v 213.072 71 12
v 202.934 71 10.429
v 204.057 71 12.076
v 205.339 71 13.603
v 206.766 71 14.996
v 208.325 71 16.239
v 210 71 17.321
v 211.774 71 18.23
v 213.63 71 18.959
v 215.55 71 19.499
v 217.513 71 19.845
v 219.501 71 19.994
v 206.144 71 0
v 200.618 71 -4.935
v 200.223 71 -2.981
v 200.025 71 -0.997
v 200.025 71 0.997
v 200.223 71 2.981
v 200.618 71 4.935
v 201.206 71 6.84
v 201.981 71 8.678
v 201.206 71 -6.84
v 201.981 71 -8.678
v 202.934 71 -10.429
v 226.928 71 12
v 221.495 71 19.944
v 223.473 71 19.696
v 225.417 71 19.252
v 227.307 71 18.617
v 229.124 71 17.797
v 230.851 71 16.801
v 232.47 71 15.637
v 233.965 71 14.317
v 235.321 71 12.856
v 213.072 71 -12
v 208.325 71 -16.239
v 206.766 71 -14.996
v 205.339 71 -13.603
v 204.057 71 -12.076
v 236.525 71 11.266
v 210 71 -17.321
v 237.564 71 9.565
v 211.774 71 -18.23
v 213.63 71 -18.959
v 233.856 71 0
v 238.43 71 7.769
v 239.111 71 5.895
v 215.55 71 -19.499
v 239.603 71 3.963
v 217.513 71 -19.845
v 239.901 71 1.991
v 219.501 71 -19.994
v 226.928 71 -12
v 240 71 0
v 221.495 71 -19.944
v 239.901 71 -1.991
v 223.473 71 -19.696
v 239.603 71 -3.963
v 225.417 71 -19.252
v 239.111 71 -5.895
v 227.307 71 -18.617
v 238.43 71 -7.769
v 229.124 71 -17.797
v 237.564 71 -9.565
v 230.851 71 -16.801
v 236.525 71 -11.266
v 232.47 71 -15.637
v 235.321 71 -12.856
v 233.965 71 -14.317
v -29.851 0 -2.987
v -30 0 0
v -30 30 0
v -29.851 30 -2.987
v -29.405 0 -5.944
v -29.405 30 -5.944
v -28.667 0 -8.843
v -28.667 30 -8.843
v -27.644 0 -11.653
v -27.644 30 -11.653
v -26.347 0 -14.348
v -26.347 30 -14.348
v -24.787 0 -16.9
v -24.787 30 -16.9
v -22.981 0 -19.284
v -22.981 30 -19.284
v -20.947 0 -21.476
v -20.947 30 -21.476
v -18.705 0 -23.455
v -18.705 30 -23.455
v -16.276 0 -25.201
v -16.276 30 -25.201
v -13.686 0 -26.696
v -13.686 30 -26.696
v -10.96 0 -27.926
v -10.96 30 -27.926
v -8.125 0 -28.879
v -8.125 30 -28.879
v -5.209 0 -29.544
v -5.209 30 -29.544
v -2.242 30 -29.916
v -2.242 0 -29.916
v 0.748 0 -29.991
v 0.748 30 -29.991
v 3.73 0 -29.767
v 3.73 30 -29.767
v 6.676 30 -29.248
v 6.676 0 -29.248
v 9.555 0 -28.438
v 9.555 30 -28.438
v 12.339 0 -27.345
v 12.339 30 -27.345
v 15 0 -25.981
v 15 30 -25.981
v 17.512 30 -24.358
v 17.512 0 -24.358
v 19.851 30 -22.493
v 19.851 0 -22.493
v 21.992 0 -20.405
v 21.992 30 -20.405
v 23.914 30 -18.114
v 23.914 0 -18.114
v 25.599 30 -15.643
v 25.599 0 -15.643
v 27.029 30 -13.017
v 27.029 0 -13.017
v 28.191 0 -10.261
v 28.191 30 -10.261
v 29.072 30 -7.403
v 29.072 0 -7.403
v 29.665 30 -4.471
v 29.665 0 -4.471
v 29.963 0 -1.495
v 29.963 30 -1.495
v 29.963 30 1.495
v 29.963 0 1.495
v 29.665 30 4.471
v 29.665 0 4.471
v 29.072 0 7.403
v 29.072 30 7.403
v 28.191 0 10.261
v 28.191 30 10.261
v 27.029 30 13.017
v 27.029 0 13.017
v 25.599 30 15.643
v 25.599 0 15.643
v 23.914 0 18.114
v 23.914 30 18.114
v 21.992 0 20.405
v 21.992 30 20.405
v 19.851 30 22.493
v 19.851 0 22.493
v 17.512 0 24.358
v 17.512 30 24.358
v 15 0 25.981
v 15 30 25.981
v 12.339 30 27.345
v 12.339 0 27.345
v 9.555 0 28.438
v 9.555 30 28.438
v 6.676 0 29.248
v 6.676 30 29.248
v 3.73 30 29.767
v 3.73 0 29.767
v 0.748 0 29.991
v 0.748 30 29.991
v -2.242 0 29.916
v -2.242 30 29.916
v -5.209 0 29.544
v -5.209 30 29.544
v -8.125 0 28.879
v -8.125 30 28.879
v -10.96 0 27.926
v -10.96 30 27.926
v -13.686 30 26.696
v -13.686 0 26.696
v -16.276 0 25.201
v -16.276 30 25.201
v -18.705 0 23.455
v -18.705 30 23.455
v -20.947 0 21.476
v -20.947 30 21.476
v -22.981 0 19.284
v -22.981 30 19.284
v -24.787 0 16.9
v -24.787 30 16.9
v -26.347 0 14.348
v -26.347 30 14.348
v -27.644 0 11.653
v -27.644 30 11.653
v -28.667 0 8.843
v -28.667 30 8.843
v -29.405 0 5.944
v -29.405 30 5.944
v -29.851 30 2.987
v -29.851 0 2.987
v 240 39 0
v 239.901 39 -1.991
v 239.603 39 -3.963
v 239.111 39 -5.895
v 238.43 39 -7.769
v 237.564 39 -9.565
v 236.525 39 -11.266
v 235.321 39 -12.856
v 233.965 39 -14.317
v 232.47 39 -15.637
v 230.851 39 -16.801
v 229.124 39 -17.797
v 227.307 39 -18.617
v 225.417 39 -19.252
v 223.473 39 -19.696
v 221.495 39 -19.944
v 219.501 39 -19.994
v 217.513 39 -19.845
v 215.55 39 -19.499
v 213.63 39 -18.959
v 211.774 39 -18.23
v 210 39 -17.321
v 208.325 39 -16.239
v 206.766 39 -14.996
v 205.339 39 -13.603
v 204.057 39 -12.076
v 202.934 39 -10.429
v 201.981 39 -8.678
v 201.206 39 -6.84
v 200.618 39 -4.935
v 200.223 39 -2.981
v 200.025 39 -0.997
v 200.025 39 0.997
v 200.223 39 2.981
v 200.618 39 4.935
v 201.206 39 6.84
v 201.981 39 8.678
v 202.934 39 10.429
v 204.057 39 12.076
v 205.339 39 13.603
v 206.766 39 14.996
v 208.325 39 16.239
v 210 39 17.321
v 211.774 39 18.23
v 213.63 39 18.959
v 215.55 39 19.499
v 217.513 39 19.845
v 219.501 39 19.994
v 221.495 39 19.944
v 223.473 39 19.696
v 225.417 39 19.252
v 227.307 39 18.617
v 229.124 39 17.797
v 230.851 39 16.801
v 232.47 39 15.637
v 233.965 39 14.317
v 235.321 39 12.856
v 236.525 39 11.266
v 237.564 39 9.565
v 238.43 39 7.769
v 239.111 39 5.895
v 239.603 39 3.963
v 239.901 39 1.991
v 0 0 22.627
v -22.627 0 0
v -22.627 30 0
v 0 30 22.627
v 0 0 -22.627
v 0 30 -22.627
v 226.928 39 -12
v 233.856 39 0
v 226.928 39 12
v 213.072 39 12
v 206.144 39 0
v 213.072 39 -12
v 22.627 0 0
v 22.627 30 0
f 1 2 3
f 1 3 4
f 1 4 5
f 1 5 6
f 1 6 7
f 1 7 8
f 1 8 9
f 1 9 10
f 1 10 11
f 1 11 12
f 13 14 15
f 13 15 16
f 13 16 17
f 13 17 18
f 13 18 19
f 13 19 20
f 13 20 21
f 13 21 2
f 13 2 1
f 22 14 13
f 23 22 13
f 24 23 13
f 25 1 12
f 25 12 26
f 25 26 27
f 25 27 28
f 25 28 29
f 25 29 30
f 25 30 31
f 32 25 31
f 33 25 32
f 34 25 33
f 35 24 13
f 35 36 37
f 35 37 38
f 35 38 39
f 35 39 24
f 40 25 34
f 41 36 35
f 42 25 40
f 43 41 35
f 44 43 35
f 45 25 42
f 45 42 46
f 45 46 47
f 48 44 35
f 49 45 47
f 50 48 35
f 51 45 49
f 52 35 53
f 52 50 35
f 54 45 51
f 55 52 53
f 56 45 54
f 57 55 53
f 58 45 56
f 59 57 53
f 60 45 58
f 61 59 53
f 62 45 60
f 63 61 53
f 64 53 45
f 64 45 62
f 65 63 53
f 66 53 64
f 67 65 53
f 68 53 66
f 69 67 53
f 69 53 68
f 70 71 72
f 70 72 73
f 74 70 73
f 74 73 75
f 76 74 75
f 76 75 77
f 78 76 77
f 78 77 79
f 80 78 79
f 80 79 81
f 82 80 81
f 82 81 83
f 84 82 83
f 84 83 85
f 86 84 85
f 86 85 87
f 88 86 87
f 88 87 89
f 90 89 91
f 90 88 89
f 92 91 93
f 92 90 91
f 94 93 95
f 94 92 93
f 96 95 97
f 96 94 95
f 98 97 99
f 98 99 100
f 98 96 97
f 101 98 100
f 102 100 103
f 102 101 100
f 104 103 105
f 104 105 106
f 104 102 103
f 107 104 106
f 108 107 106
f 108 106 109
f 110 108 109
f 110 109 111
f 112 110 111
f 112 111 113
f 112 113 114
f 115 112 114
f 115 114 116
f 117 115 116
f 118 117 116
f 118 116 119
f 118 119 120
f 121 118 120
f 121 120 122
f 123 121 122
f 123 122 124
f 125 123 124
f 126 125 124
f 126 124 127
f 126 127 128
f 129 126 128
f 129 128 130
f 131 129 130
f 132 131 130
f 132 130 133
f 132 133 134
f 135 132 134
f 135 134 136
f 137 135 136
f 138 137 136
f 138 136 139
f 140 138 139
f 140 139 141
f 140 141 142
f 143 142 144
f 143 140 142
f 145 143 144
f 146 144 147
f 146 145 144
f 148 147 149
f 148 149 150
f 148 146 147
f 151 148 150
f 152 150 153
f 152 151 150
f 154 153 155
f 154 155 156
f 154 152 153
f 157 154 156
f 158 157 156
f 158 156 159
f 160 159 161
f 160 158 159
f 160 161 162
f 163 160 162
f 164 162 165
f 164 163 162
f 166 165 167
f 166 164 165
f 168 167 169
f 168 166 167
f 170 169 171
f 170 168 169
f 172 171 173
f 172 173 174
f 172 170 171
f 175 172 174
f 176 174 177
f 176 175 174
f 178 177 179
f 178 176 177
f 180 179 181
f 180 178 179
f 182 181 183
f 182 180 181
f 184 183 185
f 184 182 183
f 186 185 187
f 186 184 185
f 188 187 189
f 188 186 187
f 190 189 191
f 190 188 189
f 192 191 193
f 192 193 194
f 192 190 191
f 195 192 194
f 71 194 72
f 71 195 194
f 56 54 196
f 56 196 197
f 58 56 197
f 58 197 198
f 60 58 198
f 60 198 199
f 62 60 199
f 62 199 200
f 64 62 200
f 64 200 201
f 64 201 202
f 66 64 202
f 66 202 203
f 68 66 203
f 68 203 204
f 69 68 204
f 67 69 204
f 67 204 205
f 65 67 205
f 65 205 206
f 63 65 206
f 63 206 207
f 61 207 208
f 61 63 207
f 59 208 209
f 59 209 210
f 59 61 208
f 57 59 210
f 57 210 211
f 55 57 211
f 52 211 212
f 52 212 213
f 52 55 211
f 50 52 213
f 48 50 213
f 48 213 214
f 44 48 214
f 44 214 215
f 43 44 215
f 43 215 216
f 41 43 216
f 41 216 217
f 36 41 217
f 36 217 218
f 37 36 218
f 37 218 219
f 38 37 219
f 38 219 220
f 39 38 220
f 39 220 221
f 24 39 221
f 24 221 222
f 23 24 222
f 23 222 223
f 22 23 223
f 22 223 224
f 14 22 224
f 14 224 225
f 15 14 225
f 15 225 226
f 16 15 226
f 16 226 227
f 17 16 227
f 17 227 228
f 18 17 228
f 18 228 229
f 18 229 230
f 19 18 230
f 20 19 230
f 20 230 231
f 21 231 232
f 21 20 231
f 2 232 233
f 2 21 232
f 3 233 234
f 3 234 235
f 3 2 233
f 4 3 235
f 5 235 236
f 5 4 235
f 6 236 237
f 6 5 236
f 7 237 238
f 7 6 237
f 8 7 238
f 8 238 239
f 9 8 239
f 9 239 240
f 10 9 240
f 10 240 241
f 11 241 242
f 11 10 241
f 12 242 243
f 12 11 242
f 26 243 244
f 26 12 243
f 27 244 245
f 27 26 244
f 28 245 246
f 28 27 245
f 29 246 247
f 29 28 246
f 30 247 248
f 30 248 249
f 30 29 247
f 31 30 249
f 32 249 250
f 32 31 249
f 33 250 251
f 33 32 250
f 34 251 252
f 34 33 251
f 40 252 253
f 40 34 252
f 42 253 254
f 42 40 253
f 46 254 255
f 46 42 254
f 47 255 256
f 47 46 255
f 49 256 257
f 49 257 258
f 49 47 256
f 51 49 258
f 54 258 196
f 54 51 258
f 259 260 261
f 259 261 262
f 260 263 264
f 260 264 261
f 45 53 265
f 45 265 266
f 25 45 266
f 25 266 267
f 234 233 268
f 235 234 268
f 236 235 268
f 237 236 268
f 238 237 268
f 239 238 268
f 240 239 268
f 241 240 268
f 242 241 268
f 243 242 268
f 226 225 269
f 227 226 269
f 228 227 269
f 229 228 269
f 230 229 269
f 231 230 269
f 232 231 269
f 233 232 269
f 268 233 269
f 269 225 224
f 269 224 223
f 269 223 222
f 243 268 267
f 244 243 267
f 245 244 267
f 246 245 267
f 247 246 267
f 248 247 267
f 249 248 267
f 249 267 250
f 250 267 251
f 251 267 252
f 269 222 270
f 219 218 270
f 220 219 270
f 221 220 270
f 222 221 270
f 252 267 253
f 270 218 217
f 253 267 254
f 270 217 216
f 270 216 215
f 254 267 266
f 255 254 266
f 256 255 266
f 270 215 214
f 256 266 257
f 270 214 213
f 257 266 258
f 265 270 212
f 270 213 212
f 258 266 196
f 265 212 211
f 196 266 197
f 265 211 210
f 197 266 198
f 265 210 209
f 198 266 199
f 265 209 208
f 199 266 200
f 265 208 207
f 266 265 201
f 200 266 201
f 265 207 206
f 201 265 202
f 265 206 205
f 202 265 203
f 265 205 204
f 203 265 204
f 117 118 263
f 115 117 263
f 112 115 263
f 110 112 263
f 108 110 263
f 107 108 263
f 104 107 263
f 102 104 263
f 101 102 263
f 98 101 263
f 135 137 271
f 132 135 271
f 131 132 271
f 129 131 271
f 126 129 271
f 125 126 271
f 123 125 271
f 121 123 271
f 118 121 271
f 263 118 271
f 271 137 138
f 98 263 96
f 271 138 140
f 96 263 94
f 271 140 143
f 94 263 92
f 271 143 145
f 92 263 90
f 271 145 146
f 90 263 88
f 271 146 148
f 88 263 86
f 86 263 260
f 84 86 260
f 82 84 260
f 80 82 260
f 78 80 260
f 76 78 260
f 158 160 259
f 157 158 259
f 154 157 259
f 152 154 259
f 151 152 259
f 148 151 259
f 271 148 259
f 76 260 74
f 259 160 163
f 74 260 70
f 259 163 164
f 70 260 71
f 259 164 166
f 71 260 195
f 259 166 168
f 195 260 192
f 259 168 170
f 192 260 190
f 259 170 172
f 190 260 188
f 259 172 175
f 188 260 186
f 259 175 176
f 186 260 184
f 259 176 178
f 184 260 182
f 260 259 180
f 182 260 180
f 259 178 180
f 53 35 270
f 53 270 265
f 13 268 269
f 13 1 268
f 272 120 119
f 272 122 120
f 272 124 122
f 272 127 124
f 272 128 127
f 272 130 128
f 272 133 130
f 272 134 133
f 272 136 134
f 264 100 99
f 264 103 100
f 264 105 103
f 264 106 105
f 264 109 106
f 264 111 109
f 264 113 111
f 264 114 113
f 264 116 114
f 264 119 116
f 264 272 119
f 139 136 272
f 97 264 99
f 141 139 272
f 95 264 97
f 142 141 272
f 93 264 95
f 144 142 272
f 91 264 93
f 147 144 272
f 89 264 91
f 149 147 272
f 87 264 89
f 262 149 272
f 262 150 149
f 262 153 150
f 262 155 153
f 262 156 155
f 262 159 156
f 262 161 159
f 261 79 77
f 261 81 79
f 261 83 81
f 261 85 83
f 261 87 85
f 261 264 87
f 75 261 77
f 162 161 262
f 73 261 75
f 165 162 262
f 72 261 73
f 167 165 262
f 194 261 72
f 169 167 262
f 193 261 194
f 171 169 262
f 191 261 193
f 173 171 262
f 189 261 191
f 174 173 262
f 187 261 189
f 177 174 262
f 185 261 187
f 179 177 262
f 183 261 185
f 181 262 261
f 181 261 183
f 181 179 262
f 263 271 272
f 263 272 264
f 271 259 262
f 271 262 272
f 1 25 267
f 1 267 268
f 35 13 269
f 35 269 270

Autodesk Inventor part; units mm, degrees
sketch "草圖1" plane through (0, 0, 0) normal (0, 1, 0) x (-1, 0, 0)
  circle A0 centre (0, 0) radius 30
  line L0 (0, 22.6274) -> (-22.6274, 0)
  line L1 (-22.6274, 0) -> (0, -22.6274)
  line L2 (0, -22.6274) -> (22.6274, 0)
  line L3 (22.6274, 0) -> (0, 22.6274)
  line L4 (17.214, 3.8392) -> (-17.214, -3.8392) construction
  line L5 (-19.542, 13.3062) -> (19.542, -13.3062) construction
  line L6 (11.3137, -11.3137) -> (-26.3636, 26.3636)
  line L7 (-11.3137, -11.3137) -> (19.159, 19.159)
  dimension "d0" = 60
  dimension "d1" = 32
  dimension "d2" = 32
extrude "擠出1" add sketch "草圖1" along normal blind 30
ref_plane "工作平面1" through (0, 71, 0) normal (0, 1, 0) x (1, 0, 0)
sketch "草圖2" plane through (0, 71, 0) normal (0, 1, 0) x (1, 0, 0)
  circle A0 centre (220, 0) radius 20
  line L0 (233.8564, 0) -> (226.9282, -12)
  line L1 (226.9282, -12) -> (213.0718, -12)
  line L2 (213.0718, -12) -> (206.1436, 0)
  line L3 (206.1436, 0) -> (213.0718, 12)
  line L4 (213.0718, 12) -> (226.9282, 12)
  line L5 (226.9282, 12) -> (233.8564, 0)
  point P0 (0, 0)
  dimension "d14" = 220
  dimension "d15" = 40
  dimension "d16" = 0
  dimension "d17" = 24
extrude "擠出2" add sketch "草圖2" against normal blind 32
sketch "草圖3" plane through (0, 0, 0) normal (0, 0, 1) x (1, 0, 0)
  line L0 (0, 0) -> (0, 30) projected
  line L1 (200, 71) -> (240, 71) projected
  line L2 (220, 71) -> (220, 39)
  arc A0 (169.4427, 55) -> (124.7214, 35) centre (169.4427, -5) ccw
  arc A1 (80, 15) -> (124.7214, 35) centre (80, 75) ccw
  line L3 (80, 15) -> (23, 15)
  line L4 (169.4427, 55) -> (204, 55)
  line L5 (204, 55) -> (204, 27.8796)
  point P0 (186.7214, 55)
  point P1 (220, 55)
  point P2 (51.5, 15)
  point P3 (0, 15)
  dimension "d39" = 32
  dimension "d40" = 60
  dimension "d41" = 60
  dimension "d58" = 23
  dimension "d59" = 80
  dimension "d60" = 204
sketch "草圖10" plane through (0, 0, 0) normal (0, 0, 1) x (1, 0, 0)
  line L0 (-30, 0) -> (30, 0) projected
  line L1 (30, 0) -> (30, 46.0087)
  line L2 (200, 39) -> (240, 39) projected
  line L3 (200, 39) -> (200, 88.733)
  point P0 (0, 0)
ref_plane "工作平面8" through (30, 0, 0) normal (1, 0, 0) x (0, 1, 0)
ref_plane "工作平面9" through (200, 39, 0) normal (-1, 0, 0) x (0, -1, 0)
sketch "草圖13" plane through (0, 30, 0) normal (0, 1, 0) x (1, 0, 0)
  point P0 (0, 0)
sketch "草圖14" plane through (220, 71, 0) normal (0, 1, 0) x (1, 0, 0)
  point P0 (-220, 0)
ref_plane "工作平面10" through (23, 15, 0) normal (-1, 0, 0) x (0, -1, 0)
sketch "草圖15" plane through (23, 15, 0) normal (-1, 0, 0) x (0, -1, 0)
  line L0 (15, 0) -> (-15, 0) projected
  ellipse E0 centre (0, 0) end of major axis (0, -19.261) minor radius 8
  dimension "d61" = 19.261
  dimension "d62" = 8
ref_plane "工作平面13" through (206.1436, 71, 0) normal (1, 0, 0) x (0, 1, 0)
sketch "草圖16" plane through (206.1436, 71, 0) normal (1, 0, 0) x (0, 1, 0)
  line L0 (-32, 0) -> (17.733, 0) projected
  ellipse E0 centre (-16, 0) end of major axis (-16, 12) minor radius 8
  point P0 (-71, 0)
  dimension "d63" = 8
  dimension "d64" = 12
properties part number "練習三"
